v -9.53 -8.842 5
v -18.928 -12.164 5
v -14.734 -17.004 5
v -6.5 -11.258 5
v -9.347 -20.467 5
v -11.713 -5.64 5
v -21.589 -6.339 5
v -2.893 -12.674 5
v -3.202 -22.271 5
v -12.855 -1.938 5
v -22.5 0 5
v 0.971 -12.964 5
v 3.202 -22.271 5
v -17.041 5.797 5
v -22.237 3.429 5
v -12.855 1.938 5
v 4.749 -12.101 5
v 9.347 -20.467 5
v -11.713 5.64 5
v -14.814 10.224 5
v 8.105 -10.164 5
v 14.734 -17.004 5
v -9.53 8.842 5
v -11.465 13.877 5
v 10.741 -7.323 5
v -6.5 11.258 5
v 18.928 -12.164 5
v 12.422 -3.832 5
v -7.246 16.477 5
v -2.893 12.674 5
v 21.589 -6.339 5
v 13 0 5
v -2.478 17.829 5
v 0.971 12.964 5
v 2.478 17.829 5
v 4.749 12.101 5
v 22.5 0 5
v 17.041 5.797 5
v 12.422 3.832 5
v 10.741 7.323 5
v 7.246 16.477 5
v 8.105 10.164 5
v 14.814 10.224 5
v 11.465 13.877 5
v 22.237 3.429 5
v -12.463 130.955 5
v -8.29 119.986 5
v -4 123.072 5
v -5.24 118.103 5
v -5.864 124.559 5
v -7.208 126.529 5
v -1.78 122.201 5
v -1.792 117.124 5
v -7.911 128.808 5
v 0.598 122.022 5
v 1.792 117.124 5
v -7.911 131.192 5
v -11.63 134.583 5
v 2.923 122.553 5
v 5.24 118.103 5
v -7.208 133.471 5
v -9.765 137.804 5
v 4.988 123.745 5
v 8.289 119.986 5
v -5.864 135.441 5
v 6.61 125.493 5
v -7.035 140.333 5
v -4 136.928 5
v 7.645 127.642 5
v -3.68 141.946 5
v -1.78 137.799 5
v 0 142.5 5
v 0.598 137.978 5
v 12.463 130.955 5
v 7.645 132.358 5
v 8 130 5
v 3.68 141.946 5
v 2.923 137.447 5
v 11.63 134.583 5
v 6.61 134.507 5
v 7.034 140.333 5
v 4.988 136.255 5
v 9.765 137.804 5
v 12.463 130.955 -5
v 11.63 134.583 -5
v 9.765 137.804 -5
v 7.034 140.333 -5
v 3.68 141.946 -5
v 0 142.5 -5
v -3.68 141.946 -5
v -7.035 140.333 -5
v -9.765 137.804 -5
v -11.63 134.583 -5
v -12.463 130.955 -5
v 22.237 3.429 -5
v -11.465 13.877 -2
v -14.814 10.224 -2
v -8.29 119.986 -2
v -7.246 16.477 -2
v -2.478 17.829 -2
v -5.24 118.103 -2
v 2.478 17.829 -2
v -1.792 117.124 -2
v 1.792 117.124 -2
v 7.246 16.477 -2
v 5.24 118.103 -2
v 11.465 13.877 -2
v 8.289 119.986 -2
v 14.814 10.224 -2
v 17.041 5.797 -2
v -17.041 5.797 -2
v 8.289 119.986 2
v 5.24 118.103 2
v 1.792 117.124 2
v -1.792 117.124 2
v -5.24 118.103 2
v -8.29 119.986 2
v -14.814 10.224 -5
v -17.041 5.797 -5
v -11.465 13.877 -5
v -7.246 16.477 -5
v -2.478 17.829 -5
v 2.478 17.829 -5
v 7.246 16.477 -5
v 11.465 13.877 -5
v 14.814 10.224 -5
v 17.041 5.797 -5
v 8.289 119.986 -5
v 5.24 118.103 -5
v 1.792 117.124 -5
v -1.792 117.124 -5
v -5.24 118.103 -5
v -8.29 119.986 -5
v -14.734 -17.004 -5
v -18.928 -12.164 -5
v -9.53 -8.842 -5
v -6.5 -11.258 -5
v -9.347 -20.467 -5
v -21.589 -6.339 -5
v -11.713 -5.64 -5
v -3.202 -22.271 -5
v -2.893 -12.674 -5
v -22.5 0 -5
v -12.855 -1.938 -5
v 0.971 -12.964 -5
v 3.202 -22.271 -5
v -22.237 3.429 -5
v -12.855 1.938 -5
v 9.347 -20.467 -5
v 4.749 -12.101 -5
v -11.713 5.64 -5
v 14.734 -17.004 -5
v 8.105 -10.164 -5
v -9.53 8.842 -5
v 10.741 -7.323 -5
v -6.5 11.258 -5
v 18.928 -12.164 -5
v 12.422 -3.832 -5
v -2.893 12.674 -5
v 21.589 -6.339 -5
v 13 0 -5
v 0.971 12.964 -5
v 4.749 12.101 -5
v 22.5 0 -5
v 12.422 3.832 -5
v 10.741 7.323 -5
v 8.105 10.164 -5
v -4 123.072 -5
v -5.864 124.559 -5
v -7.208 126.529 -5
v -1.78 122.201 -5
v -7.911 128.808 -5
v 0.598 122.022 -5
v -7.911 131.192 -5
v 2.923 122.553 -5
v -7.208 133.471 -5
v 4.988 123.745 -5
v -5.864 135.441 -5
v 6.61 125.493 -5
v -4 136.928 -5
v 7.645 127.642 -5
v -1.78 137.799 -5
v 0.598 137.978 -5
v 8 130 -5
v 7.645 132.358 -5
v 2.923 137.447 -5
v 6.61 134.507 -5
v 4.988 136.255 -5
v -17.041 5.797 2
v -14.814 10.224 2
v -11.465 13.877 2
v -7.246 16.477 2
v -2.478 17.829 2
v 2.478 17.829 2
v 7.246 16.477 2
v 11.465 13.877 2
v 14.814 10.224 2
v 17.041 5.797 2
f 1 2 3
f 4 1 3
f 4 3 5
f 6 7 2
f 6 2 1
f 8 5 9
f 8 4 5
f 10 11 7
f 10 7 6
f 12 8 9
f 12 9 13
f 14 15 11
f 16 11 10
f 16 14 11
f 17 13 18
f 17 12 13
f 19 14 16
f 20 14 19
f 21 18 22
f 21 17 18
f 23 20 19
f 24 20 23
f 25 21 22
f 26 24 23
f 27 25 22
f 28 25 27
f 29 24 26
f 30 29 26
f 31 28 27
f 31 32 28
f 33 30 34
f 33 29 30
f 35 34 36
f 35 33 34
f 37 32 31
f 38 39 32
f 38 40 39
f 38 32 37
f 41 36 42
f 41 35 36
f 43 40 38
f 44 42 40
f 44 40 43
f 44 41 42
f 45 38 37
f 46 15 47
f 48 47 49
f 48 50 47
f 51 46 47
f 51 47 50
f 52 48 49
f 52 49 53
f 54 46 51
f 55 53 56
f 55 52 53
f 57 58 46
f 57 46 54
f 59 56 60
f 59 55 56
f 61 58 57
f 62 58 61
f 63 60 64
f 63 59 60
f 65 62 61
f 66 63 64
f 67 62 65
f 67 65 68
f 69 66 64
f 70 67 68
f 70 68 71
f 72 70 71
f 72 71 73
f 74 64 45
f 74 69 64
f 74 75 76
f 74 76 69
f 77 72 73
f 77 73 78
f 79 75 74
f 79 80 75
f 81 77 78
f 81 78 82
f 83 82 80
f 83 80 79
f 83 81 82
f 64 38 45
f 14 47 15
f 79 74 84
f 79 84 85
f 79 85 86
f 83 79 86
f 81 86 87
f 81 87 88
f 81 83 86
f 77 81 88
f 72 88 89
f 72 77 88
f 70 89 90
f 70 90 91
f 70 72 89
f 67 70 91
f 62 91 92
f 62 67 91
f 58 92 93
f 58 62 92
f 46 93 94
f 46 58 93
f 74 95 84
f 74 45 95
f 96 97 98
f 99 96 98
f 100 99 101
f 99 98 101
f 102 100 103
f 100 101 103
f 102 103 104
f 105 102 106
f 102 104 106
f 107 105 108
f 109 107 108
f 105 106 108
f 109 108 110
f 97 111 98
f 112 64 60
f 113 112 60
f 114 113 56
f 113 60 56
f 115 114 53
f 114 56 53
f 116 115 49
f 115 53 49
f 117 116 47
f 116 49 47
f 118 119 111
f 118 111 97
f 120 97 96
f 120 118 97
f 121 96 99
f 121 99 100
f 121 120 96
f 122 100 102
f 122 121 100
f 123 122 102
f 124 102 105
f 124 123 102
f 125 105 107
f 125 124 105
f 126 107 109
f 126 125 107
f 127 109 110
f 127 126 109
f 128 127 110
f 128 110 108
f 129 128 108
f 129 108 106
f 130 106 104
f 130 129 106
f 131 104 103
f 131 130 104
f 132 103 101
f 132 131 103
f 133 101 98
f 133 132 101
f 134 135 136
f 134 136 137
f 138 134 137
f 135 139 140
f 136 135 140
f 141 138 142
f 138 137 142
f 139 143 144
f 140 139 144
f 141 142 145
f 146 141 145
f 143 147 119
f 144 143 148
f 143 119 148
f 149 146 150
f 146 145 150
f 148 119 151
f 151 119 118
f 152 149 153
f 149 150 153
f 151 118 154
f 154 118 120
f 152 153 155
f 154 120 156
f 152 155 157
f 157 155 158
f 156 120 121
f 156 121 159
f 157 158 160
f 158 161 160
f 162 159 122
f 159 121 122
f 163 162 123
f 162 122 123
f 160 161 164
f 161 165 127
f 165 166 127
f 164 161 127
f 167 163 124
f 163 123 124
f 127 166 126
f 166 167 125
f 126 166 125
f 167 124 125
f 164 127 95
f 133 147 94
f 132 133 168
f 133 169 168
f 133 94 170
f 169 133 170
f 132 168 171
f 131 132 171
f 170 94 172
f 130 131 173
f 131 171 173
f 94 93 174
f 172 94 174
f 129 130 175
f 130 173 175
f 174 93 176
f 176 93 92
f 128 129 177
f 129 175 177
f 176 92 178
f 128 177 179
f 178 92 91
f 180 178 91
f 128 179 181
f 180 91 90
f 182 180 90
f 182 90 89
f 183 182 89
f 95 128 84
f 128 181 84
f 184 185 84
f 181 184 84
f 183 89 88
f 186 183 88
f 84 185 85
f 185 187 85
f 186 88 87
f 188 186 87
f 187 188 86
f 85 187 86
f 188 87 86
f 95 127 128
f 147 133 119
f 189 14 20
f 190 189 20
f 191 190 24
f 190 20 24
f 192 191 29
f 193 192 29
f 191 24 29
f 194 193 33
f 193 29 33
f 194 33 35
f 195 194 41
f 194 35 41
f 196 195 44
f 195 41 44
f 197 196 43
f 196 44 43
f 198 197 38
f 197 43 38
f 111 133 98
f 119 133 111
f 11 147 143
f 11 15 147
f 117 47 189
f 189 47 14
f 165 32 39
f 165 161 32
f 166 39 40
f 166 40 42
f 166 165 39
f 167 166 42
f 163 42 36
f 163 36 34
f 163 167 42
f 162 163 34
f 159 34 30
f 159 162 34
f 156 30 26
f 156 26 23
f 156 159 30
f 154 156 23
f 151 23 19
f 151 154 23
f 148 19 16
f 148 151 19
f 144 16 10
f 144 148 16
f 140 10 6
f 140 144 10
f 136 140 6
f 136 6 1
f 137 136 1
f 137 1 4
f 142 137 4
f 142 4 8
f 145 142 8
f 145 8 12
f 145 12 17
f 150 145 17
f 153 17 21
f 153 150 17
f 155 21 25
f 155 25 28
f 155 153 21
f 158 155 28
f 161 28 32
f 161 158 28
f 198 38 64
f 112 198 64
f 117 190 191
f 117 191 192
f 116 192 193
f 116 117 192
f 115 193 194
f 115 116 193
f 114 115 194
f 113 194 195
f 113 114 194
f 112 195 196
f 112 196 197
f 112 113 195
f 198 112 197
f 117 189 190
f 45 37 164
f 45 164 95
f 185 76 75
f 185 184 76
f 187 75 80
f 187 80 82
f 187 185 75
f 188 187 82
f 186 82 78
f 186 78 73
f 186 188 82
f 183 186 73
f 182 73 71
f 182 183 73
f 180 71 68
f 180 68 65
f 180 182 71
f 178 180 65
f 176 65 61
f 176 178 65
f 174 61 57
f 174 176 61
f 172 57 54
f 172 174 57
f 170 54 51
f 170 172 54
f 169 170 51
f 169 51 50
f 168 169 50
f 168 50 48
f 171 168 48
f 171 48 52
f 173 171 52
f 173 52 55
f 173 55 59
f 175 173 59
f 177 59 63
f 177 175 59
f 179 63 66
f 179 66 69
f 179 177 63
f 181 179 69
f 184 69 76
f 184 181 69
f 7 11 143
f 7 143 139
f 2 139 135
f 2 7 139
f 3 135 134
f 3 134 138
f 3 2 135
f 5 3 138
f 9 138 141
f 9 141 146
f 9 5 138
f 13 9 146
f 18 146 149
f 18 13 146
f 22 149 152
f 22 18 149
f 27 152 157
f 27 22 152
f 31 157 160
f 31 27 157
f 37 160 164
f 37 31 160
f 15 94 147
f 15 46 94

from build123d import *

# Parameters (mm, degrees)
SKETCH1_R           = 12.5
SKETCH1_R_2         = 8
SKETCH1_R_3         = 13
BOSS_EXTRUDE1_DEPTH = 5
CUT_EXTRUDE1_DEPTH  = 3


with BuildPart() as part:
    # Sketch1 → Boss-Extrude1 (new, symmetric)
    # profile 1 of 3: a face of its own
    with BuildSketch(Plane.XY):
        with BuildLine():
            Line((-12.463466587, 130.955210764), (-22.23722085, 3.428703671))
            ThreePointArc((-22.23722085, 3.428703671), (-5.852e-06, 22.5), (22.237219067, 3.428715237))
            Line((22.237219067, 3.428715237), (12.463432081, 130.955214005))
            ThreePointArc((12.463432081, 130.955214005), (12.490841831, 130.477956524), (12.499982871, 130))
            ThreePointArc((12.499982871, 130), (-0.477972029, 117.509140978), (-12.463466587, 130.955210764))
        make_face()
    # profile 2 of 3: a face of its own
    with BuildSketch(Plane.XY):
        with Locations((-1.7129e-05, 130)):
            Circle(SKETCH1_R)
        with Locations((-1.7129e-05, 130)):
            Circle(SKETCH1_R_2, mode=Mode.SUBTRACT)
    # profile 3 of 3: a face of its own
    with BuildSketch(Plane.XY):
        with BuildLine():
            Line((-22.23722085, 3.428703671), (-22.5, 0))
            ThreePointArc((-22.5, 0), (0, -22.5), (22.5, 0))
            Line((22.5, 0), (22.237219067, 3.428715237))
            ThreePointArc((22.237219067, 3.428715237), (-5.852e-06, 22.5), (-22.23722085, 3.428703671))
        make_face()
        Circle(SKETCH1_R_3, mode=Mode.SUBTRACT)
    extrude(amount=BOSS_EXTRUDE1_DEPTH, both=True)

    # Sketch2 → Cut-Extrude1 (cut)
    with BuildSketch(Plane.XY.offset(5)):
        with BuildLine():
            Line((17.041069078, 5.796720166), (8.289478443, 119.985796928))
            ThreePointArc((8.289478443, 119.985796928), (-1.5438e-05, 117), (-8.289510096, 119.985794772))
            Line((-8.289510096, 119.985794772), (-17.041071164, 5.796714033))
            ThreePointArc((-17.041071164, 5.796714033), (-3.239e-06, 18), (17.041069078, 5.796720166))
        make_face()
    cut_extrude1 = extrude(amount=-CUT_EXTRUDE1_DEPTH, mode=Mode.SUBTRACT)

    # Mirror1: Cut-Extrude1 across plane
    add(cut_extrude1.mirror(Plane.XY), mode=Mode.SUBTRACT)


solid = part.part
